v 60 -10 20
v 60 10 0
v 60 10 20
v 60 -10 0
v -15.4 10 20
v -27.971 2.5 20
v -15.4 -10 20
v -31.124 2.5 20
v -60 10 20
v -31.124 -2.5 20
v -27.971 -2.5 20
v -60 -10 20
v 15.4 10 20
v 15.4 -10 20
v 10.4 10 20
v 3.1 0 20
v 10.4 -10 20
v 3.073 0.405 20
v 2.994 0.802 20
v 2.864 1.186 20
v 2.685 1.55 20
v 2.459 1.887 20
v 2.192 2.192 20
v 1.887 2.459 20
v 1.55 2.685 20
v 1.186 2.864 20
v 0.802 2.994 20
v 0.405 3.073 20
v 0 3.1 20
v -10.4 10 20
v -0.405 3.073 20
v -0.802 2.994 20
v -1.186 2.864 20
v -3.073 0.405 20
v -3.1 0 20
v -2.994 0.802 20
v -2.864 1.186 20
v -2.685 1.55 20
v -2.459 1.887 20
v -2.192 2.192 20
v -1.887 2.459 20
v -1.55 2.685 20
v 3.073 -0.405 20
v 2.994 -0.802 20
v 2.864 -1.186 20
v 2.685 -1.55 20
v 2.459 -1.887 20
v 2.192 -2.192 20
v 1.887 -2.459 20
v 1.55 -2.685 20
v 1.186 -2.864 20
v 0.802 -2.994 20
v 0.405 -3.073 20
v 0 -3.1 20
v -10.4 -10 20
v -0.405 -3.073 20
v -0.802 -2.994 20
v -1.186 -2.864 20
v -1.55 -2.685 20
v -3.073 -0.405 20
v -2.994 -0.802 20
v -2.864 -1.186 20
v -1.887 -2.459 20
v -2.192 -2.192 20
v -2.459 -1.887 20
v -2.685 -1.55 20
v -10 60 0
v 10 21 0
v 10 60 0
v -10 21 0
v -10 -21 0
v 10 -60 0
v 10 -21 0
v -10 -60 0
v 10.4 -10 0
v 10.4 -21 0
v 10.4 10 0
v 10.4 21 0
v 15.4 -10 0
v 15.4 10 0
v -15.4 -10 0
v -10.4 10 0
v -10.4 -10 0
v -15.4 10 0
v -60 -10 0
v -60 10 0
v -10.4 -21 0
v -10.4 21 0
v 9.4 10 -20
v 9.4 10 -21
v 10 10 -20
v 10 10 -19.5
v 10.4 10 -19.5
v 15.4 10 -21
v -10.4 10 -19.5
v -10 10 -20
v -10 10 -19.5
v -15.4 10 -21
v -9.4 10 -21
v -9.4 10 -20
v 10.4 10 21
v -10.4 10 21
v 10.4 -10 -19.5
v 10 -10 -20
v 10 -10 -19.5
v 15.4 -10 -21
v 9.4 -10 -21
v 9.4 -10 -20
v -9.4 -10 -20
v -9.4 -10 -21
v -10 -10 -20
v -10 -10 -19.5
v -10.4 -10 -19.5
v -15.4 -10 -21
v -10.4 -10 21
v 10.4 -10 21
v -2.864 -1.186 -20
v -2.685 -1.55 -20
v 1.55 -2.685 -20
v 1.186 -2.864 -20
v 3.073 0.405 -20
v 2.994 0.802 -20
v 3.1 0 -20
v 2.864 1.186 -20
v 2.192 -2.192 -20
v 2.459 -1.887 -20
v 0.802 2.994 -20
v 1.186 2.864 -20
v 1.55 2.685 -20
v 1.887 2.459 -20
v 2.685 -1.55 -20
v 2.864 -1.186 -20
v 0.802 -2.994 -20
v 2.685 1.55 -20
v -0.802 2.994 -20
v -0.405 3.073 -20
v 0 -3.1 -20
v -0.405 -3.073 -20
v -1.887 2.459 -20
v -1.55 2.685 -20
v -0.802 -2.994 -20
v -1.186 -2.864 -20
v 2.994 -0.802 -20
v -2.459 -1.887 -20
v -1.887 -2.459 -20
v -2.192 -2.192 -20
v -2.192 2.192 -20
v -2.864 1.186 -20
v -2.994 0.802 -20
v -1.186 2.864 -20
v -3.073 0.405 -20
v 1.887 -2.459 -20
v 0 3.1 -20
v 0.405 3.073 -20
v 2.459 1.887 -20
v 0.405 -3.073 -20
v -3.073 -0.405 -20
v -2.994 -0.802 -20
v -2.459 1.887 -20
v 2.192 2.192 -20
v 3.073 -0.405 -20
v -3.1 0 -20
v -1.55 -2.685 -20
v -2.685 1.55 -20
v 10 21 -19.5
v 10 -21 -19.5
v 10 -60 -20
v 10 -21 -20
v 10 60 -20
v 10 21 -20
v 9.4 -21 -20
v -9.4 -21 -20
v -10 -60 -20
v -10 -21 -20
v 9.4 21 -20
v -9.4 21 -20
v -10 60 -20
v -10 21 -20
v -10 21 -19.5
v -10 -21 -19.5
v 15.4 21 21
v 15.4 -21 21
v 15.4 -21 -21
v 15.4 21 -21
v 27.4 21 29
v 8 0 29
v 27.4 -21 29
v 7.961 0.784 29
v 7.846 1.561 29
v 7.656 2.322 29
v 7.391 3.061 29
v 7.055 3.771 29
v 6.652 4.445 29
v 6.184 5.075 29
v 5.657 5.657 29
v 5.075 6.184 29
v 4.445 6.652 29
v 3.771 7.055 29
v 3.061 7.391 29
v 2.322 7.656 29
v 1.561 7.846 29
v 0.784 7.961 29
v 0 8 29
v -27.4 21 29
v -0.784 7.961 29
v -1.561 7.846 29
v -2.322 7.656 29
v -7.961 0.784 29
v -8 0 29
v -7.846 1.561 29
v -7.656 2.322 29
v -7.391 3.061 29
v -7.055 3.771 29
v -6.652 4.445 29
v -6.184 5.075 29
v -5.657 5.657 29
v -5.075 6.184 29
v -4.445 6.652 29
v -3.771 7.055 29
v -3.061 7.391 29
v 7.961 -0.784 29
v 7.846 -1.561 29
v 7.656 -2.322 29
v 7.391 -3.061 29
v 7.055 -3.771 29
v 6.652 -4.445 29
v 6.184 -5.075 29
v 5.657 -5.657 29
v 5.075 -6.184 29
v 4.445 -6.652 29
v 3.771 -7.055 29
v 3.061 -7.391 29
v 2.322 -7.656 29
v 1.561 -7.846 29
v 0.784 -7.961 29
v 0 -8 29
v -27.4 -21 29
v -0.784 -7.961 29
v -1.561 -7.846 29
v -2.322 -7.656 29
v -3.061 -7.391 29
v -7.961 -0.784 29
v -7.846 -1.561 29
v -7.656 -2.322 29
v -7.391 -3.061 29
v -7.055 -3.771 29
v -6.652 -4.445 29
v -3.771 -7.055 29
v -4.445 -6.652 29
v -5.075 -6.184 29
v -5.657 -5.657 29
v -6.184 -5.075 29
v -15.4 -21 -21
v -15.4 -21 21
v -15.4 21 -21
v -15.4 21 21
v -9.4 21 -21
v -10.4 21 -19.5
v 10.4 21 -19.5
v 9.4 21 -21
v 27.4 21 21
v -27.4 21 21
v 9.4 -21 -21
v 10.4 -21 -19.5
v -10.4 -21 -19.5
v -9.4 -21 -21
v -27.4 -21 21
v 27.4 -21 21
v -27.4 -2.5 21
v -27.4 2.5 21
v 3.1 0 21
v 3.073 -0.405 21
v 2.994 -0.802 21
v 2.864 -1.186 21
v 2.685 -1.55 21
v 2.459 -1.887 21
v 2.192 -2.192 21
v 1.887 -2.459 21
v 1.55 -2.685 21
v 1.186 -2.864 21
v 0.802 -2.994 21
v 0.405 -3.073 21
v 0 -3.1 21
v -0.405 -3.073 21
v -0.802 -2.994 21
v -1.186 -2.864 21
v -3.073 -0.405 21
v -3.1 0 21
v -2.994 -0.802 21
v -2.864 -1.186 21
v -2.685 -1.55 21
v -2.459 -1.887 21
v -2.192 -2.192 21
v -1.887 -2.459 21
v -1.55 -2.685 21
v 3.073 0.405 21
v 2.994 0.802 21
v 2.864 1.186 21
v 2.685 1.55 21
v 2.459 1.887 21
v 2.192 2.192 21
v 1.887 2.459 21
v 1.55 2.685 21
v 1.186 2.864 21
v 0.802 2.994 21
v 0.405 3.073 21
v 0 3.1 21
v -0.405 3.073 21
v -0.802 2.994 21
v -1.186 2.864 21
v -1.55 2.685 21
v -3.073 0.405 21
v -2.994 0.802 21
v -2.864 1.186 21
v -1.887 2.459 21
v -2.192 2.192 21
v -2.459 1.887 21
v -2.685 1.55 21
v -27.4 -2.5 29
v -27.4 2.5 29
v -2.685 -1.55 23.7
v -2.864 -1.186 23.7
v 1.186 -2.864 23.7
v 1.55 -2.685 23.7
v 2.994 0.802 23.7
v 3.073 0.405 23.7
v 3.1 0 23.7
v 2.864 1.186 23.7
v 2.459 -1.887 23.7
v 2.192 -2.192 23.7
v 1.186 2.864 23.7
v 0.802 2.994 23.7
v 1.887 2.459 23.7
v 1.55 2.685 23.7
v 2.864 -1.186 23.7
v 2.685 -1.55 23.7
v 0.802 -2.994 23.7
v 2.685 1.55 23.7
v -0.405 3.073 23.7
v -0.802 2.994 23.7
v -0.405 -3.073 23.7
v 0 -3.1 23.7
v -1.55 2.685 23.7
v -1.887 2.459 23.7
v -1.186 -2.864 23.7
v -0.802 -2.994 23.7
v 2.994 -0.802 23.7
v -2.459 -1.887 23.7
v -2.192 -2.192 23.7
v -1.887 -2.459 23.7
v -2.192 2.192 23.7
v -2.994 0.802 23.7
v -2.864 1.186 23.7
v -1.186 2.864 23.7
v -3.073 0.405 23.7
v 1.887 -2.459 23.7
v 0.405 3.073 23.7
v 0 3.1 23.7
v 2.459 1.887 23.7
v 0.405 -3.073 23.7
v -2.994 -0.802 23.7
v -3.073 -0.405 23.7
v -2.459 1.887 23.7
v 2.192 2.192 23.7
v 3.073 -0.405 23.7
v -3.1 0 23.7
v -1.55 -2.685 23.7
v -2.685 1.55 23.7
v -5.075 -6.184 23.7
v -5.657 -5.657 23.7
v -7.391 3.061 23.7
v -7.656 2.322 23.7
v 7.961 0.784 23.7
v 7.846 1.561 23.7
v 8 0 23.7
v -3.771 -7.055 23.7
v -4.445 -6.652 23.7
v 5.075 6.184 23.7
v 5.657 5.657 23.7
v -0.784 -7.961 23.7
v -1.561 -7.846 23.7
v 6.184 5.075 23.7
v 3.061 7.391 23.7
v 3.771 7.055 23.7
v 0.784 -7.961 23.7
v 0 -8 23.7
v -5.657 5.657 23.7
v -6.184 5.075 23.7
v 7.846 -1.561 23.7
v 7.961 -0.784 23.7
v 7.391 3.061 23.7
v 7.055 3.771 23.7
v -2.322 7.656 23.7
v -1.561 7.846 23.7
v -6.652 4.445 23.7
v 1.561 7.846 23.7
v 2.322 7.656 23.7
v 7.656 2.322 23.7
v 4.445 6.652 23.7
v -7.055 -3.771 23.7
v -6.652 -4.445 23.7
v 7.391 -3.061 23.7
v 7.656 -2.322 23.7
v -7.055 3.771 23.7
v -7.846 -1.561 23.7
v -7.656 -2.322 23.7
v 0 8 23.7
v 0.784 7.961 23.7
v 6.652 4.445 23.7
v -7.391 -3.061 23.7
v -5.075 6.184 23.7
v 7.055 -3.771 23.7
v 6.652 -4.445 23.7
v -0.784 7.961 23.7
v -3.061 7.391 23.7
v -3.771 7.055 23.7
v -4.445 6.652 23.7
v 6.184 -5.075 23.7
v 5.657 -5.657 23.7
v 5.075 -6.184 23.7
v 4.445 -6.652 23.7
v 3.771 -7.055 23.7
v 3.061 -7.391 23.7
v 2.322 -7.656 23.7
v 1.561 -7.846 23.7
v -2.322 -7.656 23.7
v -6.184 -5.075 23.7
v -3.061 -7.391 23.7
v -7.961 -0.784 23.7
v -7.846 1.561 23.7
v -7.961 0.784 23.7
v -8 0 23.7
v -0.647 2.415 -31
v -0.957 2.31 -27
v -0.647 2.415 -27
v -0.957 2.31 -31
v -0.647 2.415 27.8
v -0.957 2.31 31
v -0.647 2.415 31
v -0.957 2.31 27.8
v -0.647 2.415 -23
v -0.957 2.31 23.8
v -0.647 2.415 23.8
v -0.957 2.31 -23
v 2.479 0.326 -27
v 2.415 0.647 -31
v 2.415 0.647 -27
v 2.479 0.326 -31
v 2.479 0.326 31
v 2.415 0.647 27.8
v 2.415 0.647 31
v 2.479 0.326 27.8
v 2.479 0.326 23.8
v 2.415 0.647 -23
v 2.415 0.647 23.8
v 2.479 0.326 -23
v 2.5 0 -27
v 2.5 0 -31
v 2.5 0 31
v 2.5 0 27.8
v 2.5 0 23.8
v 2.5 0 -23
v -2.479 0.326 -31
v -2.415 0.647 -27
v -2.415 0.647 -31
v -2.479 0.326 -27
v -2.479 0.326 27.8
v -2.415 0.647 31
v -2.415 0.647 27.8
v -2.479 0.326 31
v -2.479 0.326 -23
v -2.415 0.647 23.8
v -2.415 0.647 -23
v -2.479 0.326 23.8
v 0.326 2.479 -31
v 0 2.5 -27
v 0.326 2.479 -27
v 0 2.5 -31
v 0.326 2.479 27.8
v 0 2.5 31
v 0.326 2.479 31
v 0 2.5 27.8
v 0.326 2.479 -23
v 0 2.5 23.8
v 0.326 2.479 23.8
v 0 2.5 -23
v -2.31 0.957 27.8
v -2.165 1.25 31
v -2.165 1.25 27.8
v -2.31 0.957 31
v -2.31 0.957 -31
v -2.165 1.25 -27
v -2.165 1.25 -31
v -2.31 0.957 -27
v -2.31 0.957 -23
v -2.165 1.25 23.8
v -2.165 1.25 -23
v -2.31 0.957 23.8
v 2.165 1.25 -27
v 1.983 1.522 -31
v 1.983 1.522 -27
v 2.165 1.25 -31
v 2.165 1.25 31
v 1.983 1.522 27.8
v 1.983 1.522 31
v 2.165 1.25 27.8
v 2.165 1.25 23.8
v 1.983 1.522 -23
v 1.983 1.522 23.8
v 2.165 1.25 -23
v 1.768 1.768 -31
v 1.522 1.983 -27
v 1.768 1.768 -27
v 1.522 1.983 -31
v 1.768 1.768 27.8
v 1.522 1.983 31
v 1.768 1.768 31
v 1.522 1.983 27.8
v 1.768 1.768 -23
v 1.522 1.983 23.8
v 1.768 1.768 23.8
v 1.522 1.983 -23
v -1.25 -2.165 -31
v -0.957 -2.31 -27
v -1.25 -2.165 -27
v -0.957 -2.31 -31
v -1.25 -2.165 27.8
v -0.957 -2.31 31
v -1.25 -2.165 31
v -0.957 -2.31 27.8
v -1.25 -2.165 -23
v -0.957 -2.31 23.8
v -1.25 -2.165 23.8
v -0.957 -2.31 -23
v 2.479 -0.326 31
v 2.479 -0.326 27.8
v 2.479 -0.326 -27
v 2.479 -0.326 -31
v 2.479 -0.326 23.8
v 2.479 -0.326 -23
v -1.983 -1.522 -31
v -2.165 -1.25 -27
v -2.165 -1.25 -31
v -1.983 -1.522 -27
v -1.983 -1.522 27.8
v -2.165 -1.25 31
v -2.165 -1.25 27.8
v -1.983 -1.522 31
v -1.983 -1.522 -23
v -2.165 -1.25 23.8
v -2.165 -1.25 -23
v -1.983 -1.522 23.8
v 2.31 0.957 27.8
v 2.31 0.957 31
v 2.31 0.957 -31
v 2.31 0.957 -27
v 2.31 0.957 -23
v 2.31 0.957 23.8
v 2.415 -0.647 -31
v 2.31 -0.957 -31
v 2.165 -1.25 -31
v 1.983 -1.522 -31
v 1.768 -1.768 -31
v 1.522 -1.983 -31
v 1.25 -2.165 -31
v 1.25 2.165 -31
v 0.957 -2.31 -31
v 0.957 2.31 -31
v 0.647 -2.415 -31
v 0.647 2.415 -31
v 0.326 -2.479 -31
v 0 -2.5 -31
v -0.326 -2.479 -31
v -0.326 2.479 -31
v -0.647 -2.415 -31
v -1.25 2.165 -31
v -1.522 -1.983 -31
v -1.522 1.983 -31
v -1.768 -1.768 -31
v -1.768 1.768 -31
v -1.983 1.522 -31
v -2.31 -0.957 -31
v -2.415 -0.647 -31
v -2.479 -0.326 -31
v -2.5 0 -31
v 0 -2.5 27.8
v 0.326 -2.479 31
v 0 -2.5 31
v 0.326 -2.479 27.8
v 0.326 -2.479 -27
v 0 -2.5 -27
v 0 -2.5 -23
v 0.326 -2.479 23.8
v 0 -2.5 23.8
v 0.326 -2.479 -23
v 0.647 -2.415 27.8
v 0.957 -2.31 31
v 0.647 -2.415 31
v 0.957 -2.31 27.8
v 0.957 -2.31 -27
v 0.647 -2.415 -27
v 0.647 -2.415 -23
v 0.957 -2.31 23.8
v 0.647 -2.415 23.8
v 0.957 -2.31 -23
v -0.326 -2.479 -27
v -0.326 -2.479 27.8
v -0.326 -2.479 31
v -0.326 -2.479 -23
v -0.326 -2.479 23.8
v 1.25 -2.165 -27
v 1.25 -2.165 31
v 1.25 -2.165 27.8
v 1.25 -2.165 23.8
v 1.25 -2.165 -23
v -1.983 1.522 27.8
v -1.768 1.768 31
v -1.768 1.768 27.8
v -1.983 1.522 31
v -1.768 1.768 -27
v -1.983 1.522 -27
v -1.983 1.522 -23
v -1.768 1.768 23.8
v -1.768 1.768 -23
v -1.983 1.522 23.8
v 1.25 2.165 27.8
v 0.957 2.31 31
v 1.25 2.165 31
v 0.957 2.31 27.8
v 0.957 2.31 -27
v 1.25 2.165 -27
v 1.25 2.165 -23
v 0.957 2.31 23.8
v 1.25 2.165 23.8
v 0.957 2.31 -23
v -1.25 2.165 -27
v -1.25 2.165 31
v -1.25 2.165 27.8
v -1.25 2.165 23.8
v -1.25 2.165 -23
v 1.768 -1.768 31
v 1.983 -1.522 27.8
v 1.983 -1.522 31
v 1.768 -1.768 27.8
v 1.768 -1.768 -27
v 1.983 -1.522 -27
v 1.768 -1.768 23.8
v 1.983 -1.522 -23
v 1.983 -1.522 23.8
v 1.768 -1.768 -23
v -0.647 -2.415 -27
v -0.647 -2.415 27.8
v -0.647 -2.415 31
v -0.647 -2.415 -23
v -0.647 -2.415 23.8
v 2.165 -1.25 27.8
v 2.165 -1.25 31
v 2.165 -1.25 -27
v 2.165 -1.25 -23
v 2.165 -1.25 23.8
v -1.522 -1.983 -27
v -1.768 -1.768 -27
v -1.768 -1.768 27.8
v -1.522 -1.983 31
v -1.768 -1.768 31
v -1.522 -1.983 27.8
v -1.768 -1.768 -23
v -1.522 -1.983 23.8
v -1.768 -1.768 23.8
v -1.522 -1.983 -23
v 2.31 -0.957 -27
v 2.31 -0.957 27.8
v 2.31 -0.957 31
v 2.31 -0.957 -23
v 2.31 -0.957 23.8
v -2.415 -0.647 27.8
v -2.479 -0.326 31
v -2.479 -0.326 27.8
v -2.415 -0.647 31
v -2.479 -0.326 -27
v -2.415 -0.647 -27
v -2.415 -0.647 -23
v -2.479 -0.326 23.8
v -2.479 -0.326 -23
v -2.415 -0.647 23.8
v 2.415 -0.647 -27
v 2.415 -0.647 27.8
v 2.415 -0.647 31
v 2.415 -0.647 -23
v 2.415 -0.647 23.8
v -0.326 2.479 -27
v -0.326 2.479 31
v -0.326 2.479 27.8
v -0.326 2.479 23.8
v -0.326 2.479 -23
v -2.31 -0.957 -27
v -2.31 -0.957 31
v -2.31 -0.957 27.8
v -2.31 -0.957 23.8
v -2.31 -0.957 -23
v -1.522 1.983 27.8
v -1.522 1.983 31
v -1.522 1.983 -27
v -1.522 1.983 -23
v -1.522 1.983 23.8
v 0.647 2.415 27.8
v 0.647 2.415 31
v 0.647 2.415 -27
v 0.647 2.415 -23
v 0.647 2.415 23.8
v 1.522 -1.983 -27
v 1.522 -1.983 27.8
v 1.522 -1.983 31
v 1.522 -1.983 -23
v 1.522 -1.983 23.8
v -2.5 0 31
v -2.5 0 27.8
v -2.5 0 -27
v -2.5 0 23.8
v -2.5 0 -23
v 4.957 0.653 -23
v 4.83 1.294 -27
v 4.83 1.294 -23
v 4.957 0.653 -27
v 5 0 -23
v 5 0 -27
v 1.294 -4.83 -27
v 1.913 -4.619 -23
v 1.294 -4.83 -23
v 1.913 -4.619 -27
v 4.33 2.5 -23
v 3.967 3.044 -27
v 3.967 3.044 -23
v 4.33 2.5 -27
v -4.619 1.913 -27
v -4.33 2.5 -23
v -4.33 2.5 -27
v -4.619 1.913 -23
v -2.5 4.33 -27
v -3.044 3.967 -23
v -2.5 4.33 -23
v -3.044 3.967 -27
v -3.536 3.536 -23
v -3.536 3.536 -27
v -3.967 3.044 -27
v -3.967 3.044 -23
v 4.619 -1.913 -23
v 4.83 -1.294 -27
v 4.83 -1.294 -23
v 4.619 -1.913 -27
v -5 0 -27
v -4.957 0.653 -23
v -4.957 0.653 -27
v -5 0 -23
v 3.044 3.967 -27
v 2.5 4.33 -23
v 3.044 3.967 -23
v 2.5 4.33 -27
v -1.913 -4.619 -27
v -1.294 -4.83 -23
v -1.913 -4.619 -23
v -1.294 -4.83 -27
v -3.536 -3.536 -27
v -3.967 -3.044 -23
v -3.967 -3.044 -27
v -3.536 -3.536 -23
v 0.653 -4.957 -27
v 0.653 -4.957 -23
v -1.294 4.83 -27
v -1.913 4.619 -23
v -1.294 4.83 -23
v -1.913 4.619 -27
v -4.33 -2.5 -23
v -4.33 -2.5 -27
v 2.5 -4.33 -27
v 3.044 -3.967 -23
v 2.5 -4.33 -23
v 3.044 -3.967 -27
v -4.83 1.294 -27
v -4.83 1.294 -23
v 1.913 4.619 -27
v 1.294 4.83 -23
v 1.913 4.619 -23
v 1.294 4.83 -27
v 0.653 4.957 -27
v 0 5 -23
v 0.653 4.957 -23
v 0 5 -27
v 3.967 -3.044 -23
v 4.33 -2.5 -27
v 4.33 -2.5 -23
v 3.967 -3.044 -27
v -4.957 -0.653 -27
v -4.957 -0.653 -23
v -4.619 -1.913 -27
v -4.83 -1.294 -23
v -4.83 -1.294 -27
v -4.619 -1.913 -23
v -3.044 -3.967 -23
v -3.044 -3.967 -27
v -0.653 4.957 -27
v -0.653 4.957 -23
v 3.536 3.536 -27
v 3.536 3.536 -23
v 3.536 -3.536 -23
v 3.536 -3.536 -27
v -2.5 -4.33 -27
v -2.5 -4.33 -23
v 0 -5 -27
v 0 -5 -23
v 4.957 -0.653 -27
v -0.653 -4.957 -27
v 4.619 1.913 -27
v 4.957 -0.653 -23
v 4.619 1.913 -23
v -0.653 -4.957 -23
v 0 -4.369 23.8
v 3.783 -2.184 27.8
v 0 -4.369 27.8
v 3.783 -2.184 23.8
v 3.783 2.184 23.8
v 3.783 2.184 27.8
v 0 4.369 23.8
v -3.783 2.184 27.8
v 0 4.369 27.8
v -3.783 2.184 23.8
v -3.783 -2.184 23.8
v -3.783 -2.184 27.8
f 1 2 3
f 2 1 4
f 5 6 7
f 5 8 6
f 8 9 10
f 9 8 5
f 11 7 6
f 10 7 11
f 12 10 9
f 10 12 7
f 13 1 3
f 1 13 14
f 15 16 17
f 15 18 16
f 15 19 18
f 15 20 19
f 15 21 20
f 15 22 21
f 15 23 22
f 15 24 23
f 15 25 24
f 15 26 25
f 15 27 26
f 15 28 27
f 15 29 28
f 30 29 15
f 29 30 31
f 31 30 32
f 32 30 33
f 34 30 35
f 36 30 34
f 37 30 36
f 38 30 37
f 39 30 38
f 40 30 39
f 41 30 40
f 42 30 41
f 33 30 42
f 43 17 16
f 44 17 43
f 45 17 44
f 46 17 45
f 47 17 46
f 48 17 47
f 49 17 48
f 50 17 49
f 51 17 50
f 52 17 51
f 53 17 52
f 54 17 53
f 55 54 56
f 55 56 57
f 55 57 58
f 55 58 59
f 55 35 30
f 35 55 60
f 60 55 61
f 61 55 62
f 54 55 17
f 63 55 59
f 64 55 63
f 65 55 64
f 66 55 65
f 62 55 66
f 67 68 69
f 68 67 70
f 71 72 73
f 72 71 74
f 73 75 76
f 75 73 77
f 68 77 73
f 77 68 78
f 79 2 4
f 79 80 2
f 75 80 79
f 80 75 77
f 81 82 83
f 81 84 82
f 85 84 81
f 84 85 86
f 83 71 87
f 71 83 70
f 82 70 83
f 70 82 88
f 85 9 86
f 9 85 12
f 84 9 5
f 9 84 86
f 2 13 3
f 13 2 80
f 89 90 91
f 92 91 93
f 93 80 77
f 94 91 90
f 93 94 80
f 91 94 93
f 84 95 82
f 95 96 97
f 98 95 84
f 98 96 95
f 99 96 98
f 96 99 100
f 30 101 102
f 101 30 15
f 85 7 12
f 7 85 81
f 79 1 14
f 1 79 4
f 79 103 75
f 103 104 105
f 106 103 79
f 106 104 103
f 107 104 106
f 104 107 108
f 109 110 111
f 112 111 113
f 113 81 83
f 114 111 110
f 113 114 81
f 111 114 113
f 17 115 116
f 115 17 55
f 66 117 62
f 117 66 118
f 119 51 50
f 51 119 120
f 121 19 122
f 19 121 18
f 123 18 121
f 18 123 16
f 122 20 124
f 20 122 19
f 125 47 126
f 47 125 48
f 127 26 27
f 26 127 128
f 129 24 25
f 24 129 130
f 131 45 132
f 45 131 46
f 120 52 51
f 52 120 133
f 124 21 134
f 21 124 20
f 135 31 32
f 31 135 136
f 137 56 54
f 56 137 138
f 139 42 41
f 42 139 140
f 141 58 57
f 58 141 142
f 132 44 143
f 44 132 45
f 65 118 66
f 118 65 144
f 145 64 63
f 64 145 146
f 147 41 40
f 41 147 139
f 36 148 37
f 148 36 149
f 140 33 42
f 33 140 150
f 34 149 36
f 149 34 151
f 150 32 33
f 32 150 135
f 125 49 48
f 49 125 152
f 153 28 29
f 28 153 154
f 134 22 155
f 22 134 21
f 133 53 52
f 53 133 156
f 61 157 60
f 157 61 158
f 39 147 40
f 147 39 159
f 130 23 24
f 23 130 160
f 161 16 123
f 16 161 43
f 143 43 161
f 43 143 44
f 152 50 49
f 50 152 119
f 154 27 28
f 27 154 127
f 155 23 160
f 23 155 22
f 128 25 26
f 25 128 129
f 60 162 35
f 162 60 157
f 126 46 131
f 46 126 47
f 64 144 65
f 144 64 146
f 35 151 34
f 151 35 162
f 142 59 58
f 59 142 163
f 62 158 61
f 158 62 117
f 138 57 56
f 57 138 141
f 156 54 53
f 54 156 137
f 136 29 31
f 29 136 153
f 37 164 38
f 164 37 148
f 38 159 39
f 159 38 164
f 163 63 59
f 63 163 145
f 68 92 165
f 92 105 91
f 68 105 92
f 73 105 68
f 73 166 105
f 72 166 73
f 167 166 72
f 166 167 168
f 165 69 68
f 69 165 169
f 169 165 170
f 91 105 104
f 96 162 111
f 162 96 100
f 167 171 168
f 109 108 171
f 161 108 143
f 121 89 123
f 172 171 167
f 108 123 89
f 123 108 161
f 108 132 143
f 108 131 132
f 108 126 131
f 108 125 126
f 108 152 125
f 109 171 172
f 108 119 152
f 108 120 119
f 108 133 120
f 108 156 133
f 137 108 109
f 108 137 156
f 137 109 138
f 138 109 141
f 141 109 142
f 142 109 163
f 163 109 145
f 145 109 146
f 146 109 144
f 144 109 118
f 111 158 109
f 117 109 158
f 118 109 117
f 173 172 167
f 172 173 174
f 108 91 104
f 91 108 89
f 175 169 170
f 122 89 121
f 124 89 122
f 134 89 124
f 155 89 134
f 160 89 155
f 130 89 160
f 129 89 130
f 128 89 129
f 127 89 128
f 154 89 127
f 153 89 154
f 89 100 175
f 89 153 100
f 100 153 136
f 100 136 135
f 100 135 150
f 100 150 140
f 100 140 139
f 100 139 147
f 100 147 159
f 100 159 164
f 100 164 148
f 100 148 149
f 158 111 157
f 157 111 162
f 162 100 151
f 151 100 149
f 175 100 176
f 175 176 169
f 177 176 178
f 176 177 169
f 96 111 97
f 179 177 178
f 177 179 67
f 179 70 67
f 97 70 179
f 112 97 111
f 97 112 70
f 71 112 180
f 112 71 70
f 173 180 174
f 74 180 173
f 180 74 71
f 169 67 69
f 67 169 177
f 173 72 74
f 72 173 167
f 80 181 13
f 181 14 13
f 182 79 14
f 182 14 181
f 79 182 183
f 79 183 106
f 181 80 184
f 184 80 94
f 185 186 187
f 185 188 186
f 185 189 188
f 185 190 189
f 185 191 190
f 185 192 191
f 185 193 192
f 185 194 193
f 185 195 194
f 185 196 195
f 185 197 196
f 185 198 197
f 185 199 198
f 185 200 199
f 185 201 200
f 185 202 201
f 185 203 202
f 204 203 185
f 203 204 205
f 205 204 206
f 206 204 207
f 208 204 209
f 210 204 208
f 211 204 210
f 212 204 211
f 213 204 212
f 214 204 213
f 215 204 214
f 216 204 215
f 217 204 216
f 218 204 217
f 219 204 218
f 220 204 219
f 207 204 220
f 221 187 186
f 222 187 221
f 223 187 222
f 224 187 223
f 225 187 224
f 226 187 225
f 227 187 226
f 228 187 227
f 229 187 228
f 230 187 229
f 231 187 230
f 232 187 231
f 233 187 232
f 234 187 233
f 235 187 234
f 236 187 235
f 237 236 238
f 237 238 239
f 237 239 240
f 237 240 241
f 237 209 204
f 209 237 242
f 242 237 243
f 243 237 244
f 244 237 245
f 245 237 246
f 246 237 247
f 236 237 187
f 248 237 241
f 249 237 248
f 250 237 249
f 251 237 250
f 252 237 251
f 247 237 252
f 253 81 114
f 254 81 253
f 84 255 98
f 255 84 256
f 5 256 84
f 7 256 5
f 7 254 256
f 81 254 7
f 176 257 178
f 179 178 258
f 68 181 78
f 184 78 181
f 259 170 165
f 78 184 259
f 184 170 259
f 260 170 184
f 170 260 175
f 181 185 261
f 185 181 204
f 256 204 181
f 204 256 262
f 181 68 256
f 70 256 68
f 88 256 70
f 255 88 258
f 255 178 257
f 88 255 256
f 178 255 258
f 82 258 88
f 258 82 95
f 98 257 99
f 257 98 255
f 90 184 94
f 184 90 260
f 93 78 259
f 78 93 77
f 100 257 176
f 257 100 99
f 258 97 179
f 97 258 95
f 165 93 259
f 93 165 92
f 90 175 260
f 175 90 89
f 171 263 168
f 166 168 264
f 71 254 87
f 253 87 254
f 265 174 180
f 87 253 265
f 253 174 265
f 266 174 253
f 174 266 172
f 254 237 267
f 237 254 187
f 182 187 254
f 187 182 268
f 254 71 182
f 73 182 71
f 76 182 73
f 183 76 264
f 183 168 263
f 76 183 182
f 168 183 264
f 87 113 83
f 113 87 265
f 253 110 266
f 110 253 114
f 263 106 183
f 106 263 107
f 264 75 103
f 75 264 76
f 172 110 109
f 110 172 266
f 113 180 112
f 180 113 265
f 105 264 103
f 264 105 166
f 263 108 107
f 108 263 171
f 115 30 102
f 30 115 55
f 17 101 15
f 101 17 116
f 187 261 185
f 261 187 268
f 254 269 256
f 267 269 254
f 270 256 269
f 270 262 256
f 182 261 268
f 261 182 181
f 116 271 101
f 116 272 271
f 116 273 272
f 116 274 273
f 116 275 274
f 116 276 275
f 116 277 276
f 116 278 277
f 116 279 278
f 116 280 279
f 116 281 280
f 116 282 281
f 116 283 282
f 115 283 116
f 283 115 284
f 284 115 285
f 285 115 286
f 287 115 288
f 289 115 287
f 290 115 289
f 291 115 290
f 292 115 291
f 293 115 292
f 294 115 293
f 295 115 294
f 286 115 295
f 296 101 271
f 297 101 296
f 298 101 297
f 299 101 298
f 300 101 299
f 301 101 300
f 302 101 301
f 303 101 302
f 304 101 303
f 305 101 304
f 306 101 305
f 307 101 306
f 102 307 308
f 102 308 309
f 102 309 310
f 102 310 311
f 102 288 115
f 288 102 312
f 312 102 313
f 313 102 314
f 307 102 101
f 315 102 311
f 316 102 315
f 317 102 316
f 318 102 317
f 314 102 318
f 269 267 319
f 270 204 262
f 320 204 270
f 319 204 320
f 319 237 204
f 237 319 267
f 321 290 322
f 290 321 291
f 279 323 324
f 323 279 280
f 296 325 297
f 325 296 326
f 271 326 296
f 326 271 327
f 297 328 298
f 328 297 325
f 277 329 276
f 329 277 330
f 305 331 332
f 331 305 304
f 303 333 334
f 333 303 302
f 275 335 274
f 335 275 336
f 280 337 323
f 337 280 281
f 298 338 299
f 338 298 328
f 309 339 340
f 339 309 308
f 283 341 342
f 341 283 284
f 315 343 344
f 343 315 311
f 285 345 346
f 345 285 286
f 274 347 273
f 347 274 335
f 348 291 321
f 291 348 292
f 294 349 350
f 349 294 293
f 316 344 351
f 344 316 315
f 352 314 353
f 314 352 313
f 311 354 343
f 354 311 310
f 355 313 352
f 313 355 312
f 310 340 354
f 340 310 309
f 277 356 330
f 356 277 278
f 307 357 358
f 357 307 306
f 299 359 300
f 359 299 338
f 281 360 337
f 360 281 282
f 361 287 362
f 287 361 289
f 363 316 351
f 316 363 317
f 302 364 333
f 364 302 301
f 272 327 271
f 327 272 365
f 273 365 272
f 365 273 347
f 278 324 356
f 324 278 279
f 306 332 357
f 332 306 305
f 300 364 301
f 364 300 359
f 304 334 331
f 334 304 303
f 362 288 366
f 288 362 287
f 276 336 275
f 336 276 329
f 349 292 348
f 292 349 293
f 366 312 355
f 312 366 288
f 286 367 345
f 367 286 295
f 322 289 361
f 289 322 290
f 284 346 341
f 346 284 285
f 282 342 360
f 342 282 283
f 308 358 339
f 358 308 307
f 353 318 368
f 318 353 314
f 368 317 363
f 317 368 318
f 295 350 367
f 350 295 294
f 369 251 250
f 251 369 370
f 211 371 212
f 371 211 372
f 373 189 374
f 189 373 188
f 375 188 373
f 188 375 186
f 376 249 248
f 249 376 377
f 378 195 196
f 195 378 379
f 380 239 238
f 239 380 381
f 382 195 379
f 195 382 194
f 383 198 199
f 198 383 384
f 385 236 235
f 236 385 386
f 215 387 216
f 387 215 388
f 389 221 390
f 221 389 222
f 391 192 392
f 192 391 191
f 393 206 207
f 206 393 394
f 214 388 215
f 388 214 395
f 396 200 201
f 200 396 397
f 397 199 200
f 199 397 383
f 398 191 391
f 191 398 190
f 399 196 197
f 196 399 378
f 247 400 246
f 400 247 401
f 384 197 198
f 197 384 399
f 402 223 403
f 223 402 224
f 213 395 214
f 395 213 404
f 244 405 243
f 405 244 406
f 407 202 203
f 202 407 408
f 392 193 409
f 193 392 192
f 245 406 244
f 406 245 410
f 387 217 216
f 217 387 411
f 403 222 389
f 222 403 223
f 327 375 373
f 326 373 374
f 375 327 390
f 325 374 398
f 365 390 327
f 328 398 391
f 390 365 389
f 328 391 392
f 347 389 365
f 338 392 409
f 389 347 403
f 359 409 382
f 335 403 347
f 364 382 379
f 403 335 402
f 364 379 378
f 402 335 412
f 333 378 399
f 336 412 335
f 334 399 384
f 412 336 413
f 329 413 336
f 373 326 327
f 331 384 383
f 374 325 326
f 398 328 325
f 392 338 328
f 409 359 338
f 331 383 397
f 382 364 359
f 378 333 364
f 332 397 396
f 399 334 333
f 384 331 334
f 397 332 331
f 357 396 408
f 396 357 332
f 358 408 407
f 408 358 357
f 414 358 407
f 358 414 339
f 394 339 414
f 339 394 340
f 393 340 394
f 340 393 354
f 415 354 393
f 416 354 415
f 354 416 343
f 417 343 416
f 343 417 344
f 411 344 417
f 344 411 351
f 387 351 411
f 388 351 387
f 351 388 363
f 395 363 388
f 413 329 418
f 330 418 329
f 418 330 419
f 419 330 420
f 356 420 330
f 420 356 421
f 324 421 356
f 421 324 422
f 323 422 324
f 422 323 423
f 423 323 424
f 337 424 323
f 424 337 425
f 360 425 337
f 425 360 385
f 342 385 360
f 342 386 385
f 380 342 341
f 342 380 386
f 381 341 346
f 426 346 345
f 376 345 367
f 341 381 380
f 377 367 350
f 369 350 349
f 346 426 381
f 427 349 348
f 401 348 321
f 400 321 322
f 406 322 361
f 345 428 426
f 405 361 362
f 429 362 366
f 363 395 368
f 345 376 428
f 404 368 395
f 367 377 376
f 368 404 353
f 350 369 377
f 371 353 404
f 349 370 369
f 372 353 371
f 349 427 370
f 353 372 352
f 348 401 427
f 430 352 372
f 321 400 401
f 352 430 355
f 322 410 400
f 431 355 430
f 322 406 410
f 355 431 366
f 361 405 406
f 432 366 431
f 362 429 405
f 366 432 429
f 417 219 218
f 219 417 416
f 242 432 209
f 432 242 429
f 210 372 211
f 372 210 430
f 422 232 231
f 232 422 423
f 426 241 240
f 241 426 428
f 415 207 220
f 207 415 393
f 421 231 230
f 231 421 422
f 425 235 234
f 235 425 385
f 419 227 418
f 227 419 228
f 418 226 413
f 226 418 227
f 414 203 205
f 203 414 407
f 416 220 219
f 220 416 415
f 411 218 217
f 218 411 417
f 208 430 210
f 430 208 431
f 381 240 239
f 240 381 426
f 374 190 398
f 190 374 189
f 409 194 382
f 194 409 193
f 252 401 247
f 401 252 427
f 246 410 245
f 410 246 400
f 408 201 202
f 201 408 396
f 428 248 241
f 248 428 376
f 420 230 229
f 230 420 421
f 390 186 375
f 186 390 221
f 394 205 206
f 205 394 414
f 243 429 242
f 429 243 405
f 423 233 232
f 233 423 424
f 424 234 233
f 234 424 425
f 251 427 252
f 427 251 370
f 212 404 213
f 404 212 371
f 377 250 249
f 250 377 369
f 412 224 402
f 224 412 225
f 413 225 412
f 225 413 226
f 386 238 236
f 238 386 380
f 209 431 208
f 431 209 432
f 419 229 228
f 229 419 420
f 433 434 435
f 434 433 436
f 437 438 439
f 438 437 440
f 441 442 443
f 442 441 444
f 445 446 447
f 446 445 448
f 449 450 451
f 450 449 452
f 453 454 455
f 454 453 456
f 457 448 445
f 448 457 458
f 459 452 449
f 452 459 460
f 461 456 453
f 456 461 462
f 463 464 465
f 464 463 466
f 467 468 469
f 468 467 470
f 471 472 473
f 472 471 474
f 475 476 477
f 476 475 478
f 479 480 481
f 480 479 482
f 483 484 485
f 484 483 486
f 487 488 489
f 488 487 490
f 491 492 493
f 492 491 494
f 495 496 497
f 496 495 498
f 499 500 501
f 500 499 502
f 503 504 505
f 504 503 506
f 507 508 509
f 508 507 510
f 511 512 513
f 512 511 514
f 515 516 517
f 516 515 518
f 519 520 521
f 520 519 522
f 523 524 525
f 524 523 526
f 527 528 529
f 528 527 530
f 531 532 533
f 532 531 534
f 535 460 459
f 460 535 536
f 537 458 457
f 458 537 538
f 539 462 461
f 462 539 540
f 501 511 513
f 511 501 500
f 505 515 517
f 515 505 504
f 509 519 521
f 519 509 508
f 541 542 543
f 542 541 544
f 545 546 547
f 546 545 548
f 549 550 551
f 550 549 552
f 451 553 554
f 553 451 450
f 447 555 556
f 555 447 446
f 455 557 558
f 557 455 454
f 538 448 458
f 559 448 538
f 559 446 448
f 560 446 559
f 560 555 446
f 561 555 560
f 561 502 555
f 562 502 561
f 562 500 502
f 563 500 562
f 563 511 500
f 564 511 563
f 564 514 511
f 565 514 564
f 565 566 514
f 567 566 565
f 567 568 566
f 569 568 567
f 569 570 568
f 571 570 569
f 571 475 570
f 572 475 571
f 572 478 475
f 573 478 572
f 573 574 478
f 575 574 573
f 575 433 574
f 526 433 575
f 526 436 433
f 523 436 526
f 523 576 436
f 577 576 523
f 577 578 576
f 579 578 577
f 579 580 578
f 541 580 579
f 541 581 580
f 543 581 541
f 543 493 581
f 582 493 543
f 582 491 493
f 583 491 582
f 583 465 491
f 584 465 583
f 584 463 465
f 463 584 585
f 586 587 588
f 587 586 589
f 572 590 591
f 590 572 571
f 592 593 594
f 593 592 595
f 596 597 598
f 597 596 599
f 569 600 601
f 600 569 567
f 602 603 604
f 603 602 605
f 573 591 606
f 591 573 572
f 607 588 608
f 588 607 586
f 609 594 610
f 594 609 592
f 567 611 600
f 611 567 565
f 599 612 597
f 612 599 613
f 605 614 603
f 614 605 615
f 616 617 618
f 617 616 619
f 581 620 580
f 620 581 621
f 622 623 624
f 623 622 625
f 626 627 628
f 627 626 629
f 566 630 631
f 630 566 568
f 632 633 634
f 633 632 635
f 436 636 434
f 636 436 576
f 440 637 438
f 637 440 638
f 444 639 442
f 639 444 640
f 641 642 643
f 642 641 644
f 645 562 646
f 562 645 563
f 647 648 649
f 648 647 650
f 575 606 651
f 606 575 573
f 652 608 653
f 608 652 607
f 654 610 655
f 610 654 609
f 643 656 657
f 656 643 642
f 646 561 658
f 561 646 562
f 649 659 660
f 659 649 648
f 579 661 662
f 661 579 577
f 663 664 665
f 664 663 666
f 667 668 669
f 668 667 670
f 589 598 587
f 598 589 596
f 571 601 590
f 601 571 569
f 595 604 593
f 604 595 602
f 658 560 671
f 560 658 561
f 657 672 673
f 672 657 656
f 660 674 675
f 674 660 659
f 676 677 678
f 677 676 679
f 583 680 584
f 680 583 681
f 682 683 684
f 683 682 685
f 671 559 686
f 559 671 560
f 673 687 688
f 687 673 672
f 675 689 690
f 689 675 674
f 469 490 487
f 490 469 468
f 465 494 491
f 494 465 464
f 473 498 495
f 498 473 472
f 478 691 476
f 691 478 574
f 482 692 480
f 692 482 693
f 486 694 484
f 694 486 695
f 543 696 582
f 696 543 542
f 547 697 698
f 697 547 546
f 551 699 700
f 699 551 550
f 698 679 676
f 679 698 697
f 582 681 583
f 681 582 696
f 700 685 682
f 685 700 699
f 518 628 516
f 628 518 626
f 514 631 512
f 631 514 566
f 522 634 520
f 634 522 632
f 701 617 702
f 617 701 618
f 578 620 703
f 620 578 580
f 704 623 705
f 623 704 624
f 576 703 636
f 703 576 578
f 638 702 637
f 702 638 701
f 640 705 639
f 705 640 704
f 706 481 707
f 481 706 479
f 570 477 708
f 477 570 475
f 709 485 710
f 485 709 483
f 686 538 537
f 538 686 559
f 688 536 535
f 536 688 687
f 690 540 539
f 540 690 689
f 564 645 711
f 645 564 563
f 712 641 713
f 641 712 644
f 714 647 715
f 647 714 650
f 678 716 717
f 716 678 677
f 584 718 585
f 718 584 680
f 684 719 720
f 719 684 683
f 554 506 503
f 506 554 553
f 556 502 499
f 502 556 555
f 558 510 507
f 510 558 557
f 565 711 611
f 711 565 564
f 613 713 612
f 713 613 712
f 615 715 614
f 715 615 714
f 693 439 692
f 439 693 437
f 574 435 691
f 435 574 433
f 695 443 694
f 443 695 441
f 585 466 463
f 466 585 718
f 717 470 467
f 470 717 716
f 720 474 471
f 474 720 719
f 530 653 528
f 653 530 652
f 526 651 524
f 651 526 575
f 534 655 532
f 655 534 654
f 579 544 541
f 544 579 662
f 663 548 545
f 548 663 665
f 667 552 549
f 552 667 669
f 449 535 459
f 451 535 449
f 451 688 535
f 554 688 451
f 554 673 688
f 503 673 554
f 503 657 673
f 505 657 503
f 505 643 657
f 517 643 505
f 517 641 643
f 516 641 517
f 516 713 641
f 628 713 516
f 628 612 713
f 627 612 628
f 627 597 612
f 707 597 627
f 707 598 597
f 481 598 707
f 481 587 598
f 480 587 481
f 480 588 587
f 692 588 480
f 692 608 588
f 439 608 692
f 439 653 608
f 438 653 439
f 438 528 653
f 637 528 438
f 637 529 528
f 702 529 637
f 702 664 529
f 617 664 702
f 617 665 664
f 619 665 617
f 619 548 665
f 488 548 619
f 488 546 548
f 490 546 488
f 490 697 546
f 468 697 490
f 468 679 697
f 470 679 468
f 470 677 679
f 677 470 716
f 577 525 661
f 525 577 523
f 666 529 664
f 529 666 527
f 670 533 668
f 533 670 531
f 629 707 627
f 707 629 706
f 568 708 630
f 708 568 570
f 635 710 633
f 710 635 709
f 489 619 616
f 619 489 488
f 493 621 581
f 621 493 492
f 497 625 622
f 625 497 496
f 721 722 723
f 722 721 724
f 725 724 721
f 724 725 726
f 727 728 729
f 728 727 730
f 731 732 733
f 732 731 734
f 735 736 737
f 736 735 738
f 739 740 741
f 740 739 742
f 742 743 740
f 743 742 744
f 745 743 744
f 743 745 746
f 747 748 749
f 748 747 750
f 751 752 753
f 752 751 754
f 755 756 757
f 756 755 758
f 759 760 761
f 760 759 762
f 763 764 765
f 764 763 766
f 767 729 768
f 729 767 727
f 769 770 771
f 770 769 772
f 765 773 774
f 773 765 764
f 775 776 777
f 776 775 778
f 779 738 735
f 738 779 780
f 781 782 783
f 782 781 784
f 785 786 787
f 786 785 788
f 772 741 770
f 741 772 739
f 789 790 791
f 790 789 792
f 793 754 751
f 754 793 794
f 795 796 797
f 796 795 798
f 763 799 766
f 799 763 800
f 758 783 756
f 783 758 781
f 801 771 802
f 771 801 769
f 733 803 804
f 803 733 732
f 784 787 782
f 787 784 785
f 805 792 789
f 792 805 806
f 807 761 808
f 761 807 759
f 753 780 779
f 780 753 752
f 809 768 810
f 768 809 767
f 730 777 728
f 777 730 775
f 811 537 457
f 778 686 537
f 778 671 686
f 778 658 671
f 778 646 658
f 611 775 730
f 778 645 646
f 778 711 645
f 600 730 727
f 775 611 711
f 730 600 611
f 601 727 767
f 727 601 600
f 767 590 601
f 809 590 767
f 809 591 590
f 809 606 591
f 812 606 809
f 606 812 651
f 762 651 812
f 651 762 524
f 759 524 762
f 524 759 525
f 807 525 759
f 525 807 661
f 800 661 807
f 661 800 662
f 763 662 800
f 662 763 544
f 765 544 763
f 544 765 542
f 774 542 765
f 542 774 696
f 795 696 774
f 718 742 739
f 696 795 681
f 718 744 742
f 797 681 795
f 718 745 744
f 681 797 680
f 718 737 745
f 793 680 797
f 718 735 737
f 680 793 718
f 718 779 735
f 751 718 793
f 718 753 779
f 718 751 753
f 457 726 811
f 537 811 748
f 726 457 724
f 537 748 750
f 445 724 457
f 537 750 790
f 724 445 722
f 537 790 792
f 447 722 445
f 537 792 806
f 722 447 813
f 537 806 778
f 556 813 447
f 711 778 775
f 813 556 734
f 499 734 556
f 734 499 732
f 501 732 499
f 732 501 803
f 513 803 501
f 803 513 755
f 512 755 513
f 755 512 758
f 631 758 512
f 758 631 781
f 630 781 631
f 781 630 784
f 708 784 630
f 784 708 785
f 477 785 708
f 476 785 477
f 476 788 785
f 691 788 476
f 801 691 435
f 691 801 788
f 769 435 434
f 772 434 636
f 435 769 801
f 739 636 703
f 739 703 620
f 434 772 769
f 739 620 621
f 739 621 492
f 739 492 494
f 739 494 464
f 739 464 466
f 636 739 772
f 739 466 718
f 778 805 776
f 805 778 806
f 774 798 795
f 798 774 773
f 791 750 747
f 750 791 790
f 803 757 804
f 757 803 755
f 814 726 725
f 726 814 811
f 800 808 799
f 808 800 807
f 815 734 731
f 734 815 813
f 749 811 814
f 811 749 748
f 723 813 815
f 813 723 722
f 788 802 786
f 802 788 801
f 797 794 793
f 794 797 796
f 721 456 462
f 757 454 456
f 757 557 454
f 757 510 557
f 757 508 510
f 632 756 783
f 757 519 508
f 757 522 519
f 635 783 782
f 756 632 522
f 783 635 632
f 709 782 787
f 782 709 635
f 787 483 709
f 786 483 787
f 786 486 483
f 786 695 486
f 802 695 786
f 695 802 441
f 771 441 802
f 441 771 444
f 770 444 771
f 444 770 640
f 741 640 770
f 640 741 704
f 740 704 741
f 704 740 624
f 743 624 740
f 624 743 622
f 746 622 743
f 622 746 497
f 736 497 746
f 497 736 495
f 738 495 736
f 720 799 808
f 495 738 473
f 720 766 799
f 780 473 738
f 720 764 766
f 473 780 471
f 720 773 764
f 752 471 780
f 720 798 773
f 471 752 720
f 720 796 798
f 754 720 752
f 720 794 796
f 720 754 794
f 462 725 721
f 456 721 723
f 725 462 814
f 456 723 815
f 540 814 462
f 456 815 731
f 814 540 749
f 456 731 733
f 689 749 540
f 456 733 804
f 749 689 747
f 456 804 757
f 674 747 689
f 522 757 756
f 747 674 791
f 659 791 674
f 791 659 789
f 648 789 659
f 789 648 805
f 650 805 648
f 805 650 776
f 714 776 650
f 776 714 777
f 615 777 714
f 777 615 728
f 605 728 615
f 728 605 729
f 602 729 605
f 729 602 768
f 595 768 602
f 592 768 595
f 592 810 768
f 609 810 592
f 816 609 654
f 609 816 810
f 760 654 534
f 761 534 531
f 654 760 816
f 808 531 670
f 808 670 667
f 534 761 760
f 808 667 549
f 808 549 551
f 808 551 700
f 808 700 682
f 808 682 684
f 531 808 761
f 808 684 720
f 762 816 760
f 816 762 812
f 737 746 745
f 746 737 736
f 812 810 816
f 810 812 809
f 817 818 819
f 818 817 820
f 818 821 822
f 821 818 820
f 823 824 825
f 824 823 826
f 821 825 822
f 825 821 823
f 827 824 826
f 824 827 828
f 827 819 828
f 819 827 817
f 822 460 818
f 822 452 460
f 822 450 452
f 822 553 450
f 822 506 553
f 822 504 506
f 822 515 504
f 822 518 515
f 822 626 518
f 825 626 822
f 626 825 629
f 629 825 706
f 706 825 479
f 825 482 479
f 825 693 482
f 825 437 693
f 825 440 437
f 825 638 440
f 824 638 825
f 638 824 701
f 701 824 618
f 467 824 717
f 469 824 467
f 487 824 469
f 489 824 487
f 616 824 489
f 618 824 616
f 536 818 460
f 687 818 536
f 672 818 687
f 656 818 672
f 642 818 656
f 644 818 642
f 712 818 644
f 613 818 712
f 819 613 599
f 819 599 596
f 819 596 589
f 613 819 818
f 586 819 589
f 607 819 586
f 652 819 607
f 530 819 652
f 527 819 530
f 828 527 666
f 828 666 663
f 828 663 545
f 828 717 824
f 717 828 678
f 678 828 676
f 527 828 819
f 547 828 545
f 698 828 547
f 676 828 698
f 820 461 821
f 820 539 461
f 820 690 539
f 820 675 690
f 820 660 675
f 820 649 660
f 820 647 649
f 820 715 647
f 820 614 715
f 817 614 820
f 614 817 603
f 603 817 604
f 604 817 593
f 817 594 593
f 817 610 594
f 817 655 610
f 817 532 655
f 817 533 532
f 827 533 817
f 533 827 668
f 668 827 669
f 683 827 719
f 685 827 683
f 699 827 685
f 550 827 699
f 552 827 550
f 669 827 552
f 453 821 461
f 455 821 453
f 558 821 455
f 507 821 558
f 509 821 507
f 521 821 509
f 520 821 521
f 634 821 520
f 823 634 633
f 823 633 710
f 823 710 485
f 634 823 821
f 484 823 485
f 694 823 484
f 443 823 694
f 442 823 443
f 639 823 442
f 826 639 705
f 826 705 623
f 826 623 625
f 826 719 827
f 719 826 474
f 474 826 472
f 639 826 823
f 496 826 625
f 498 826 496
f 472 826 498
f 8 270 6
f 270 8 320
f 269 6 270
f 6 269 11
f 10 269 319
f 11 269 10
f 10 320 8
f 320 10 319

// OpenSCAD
// Candidate v0.9: v0.7 eaves12 plus a solid sloped wall on the -X end.
//
// Coordinate contract (same as v0.7):
//   x = barrier long direction
//   y = front/back direction
//   z = vertical direction
//
// This file deliberately imports v0.7 with `use` and does not modify it.
// The imported v0.7 model already contains the accepted +/-12 mm X eaves,
// the round top nut pocket, the vertical through-hole, and the 20 mm Y gap.

use <../perpendicular-u-joint-guard-v0.7/perpendicular_double_u_guard.scad>;

$fn = 48;

PART = "candidate_iso";

// These values are explicit here so the candidate remains reviewable even
// though OpenSCAD `use` imports modules rather than the source's top-level
// variables.
candidate_roof_x_min = -27.4; // v0.7 roof width 54.8, eaves12
candidate_roof_bottom_z = 21.0;
candidate_roof_top_z = 29.0;
sloped_wall_run_x = 12.0;
sloped_wall_end_x = candidate_roof_x_min - sloped_wall_run_x;
sloped_wall_landing_z = 0.0; // blue lower tube's top surface
sloped_wall_depth_y = 5.0;  // solid plate depth, not a thin visual line

assert(sloped_wall_landing_z == 0,
       "蓝色下方方管上表面在当前坐标中必须是 z=0");
assert(sloped_wall_run_x > 0, "斜墙必须向 -X 延伸");
assert(sloped_wall_end_x < candidate_roof_x_min,
       "斜墙下端必须位于屋檐 -X 端之外");

module solid_sloped_wall_candidate() {
    // A triangular prism in the XZ plane, extruded 5 mm along Y.  Its full
    // vertical roof-end edge overlaps the existing roof from z=21..29, while
    // its diagonal edge travels toward -X and ends exactly at z=0.
    // This is a solid wall/gusset, not a line or decorative rib.
    rotate([90, 0, 0])
        linear_extrude(height = sloped_wall_depth_y,
                       center = true,
                       convexity = 10)
            polygon(points = [
                [candidate_roof_x_min, candidate_roof_bottom_z],
                [candidate_roof_x_min, candidate_roof_top_z],
                [sloped_wall_end_x, sloped_wall_landing_z]
            ]);
}

module candidate_clip() {
    // The imported v0.7 body remains one printable solid; the new prism is
    // overlapped into the -X roof edge so the union is connected.
    union() {
        double_u_clip();
        solid_sloped_wall_candidate();
    }
}

module candidate_assembly_iso() {
    // Context only: gray upper tube is along X, blue lower tube is along Y.
    upper_long_tube();
    lower_cross_tube();
    // Keep the candidate wall visually distinct in review renders.  The STL
    // export uses candidate_clip(), so these review colors do not split the
    // printable part into separate objects.
    color([0.96, 0.39, 0.08]) double_u_clip();
    color([0.82, 0.16, 0.08]) solid_sloped_wall_candidate();
    vertical_joint_screw();
}

module candidate_assembly_xz() {
    // Deliberately omit the gray upper tube in this XZ check view.
    lower_cross_tube();
    color([0.96, 0.39, 0.08]) double_u_clip();
    color([0.82, 0.16, 0.08]) solid_sloped_wall_candidate();
    vertical_joint_screw();
}

if (PART == "candidate_clip") {
    candidate_clip();
} else if (PART == "candidate_xz") {
    candidate_assembly_xz();
} else {
    candidate_assembly_iso();
}
